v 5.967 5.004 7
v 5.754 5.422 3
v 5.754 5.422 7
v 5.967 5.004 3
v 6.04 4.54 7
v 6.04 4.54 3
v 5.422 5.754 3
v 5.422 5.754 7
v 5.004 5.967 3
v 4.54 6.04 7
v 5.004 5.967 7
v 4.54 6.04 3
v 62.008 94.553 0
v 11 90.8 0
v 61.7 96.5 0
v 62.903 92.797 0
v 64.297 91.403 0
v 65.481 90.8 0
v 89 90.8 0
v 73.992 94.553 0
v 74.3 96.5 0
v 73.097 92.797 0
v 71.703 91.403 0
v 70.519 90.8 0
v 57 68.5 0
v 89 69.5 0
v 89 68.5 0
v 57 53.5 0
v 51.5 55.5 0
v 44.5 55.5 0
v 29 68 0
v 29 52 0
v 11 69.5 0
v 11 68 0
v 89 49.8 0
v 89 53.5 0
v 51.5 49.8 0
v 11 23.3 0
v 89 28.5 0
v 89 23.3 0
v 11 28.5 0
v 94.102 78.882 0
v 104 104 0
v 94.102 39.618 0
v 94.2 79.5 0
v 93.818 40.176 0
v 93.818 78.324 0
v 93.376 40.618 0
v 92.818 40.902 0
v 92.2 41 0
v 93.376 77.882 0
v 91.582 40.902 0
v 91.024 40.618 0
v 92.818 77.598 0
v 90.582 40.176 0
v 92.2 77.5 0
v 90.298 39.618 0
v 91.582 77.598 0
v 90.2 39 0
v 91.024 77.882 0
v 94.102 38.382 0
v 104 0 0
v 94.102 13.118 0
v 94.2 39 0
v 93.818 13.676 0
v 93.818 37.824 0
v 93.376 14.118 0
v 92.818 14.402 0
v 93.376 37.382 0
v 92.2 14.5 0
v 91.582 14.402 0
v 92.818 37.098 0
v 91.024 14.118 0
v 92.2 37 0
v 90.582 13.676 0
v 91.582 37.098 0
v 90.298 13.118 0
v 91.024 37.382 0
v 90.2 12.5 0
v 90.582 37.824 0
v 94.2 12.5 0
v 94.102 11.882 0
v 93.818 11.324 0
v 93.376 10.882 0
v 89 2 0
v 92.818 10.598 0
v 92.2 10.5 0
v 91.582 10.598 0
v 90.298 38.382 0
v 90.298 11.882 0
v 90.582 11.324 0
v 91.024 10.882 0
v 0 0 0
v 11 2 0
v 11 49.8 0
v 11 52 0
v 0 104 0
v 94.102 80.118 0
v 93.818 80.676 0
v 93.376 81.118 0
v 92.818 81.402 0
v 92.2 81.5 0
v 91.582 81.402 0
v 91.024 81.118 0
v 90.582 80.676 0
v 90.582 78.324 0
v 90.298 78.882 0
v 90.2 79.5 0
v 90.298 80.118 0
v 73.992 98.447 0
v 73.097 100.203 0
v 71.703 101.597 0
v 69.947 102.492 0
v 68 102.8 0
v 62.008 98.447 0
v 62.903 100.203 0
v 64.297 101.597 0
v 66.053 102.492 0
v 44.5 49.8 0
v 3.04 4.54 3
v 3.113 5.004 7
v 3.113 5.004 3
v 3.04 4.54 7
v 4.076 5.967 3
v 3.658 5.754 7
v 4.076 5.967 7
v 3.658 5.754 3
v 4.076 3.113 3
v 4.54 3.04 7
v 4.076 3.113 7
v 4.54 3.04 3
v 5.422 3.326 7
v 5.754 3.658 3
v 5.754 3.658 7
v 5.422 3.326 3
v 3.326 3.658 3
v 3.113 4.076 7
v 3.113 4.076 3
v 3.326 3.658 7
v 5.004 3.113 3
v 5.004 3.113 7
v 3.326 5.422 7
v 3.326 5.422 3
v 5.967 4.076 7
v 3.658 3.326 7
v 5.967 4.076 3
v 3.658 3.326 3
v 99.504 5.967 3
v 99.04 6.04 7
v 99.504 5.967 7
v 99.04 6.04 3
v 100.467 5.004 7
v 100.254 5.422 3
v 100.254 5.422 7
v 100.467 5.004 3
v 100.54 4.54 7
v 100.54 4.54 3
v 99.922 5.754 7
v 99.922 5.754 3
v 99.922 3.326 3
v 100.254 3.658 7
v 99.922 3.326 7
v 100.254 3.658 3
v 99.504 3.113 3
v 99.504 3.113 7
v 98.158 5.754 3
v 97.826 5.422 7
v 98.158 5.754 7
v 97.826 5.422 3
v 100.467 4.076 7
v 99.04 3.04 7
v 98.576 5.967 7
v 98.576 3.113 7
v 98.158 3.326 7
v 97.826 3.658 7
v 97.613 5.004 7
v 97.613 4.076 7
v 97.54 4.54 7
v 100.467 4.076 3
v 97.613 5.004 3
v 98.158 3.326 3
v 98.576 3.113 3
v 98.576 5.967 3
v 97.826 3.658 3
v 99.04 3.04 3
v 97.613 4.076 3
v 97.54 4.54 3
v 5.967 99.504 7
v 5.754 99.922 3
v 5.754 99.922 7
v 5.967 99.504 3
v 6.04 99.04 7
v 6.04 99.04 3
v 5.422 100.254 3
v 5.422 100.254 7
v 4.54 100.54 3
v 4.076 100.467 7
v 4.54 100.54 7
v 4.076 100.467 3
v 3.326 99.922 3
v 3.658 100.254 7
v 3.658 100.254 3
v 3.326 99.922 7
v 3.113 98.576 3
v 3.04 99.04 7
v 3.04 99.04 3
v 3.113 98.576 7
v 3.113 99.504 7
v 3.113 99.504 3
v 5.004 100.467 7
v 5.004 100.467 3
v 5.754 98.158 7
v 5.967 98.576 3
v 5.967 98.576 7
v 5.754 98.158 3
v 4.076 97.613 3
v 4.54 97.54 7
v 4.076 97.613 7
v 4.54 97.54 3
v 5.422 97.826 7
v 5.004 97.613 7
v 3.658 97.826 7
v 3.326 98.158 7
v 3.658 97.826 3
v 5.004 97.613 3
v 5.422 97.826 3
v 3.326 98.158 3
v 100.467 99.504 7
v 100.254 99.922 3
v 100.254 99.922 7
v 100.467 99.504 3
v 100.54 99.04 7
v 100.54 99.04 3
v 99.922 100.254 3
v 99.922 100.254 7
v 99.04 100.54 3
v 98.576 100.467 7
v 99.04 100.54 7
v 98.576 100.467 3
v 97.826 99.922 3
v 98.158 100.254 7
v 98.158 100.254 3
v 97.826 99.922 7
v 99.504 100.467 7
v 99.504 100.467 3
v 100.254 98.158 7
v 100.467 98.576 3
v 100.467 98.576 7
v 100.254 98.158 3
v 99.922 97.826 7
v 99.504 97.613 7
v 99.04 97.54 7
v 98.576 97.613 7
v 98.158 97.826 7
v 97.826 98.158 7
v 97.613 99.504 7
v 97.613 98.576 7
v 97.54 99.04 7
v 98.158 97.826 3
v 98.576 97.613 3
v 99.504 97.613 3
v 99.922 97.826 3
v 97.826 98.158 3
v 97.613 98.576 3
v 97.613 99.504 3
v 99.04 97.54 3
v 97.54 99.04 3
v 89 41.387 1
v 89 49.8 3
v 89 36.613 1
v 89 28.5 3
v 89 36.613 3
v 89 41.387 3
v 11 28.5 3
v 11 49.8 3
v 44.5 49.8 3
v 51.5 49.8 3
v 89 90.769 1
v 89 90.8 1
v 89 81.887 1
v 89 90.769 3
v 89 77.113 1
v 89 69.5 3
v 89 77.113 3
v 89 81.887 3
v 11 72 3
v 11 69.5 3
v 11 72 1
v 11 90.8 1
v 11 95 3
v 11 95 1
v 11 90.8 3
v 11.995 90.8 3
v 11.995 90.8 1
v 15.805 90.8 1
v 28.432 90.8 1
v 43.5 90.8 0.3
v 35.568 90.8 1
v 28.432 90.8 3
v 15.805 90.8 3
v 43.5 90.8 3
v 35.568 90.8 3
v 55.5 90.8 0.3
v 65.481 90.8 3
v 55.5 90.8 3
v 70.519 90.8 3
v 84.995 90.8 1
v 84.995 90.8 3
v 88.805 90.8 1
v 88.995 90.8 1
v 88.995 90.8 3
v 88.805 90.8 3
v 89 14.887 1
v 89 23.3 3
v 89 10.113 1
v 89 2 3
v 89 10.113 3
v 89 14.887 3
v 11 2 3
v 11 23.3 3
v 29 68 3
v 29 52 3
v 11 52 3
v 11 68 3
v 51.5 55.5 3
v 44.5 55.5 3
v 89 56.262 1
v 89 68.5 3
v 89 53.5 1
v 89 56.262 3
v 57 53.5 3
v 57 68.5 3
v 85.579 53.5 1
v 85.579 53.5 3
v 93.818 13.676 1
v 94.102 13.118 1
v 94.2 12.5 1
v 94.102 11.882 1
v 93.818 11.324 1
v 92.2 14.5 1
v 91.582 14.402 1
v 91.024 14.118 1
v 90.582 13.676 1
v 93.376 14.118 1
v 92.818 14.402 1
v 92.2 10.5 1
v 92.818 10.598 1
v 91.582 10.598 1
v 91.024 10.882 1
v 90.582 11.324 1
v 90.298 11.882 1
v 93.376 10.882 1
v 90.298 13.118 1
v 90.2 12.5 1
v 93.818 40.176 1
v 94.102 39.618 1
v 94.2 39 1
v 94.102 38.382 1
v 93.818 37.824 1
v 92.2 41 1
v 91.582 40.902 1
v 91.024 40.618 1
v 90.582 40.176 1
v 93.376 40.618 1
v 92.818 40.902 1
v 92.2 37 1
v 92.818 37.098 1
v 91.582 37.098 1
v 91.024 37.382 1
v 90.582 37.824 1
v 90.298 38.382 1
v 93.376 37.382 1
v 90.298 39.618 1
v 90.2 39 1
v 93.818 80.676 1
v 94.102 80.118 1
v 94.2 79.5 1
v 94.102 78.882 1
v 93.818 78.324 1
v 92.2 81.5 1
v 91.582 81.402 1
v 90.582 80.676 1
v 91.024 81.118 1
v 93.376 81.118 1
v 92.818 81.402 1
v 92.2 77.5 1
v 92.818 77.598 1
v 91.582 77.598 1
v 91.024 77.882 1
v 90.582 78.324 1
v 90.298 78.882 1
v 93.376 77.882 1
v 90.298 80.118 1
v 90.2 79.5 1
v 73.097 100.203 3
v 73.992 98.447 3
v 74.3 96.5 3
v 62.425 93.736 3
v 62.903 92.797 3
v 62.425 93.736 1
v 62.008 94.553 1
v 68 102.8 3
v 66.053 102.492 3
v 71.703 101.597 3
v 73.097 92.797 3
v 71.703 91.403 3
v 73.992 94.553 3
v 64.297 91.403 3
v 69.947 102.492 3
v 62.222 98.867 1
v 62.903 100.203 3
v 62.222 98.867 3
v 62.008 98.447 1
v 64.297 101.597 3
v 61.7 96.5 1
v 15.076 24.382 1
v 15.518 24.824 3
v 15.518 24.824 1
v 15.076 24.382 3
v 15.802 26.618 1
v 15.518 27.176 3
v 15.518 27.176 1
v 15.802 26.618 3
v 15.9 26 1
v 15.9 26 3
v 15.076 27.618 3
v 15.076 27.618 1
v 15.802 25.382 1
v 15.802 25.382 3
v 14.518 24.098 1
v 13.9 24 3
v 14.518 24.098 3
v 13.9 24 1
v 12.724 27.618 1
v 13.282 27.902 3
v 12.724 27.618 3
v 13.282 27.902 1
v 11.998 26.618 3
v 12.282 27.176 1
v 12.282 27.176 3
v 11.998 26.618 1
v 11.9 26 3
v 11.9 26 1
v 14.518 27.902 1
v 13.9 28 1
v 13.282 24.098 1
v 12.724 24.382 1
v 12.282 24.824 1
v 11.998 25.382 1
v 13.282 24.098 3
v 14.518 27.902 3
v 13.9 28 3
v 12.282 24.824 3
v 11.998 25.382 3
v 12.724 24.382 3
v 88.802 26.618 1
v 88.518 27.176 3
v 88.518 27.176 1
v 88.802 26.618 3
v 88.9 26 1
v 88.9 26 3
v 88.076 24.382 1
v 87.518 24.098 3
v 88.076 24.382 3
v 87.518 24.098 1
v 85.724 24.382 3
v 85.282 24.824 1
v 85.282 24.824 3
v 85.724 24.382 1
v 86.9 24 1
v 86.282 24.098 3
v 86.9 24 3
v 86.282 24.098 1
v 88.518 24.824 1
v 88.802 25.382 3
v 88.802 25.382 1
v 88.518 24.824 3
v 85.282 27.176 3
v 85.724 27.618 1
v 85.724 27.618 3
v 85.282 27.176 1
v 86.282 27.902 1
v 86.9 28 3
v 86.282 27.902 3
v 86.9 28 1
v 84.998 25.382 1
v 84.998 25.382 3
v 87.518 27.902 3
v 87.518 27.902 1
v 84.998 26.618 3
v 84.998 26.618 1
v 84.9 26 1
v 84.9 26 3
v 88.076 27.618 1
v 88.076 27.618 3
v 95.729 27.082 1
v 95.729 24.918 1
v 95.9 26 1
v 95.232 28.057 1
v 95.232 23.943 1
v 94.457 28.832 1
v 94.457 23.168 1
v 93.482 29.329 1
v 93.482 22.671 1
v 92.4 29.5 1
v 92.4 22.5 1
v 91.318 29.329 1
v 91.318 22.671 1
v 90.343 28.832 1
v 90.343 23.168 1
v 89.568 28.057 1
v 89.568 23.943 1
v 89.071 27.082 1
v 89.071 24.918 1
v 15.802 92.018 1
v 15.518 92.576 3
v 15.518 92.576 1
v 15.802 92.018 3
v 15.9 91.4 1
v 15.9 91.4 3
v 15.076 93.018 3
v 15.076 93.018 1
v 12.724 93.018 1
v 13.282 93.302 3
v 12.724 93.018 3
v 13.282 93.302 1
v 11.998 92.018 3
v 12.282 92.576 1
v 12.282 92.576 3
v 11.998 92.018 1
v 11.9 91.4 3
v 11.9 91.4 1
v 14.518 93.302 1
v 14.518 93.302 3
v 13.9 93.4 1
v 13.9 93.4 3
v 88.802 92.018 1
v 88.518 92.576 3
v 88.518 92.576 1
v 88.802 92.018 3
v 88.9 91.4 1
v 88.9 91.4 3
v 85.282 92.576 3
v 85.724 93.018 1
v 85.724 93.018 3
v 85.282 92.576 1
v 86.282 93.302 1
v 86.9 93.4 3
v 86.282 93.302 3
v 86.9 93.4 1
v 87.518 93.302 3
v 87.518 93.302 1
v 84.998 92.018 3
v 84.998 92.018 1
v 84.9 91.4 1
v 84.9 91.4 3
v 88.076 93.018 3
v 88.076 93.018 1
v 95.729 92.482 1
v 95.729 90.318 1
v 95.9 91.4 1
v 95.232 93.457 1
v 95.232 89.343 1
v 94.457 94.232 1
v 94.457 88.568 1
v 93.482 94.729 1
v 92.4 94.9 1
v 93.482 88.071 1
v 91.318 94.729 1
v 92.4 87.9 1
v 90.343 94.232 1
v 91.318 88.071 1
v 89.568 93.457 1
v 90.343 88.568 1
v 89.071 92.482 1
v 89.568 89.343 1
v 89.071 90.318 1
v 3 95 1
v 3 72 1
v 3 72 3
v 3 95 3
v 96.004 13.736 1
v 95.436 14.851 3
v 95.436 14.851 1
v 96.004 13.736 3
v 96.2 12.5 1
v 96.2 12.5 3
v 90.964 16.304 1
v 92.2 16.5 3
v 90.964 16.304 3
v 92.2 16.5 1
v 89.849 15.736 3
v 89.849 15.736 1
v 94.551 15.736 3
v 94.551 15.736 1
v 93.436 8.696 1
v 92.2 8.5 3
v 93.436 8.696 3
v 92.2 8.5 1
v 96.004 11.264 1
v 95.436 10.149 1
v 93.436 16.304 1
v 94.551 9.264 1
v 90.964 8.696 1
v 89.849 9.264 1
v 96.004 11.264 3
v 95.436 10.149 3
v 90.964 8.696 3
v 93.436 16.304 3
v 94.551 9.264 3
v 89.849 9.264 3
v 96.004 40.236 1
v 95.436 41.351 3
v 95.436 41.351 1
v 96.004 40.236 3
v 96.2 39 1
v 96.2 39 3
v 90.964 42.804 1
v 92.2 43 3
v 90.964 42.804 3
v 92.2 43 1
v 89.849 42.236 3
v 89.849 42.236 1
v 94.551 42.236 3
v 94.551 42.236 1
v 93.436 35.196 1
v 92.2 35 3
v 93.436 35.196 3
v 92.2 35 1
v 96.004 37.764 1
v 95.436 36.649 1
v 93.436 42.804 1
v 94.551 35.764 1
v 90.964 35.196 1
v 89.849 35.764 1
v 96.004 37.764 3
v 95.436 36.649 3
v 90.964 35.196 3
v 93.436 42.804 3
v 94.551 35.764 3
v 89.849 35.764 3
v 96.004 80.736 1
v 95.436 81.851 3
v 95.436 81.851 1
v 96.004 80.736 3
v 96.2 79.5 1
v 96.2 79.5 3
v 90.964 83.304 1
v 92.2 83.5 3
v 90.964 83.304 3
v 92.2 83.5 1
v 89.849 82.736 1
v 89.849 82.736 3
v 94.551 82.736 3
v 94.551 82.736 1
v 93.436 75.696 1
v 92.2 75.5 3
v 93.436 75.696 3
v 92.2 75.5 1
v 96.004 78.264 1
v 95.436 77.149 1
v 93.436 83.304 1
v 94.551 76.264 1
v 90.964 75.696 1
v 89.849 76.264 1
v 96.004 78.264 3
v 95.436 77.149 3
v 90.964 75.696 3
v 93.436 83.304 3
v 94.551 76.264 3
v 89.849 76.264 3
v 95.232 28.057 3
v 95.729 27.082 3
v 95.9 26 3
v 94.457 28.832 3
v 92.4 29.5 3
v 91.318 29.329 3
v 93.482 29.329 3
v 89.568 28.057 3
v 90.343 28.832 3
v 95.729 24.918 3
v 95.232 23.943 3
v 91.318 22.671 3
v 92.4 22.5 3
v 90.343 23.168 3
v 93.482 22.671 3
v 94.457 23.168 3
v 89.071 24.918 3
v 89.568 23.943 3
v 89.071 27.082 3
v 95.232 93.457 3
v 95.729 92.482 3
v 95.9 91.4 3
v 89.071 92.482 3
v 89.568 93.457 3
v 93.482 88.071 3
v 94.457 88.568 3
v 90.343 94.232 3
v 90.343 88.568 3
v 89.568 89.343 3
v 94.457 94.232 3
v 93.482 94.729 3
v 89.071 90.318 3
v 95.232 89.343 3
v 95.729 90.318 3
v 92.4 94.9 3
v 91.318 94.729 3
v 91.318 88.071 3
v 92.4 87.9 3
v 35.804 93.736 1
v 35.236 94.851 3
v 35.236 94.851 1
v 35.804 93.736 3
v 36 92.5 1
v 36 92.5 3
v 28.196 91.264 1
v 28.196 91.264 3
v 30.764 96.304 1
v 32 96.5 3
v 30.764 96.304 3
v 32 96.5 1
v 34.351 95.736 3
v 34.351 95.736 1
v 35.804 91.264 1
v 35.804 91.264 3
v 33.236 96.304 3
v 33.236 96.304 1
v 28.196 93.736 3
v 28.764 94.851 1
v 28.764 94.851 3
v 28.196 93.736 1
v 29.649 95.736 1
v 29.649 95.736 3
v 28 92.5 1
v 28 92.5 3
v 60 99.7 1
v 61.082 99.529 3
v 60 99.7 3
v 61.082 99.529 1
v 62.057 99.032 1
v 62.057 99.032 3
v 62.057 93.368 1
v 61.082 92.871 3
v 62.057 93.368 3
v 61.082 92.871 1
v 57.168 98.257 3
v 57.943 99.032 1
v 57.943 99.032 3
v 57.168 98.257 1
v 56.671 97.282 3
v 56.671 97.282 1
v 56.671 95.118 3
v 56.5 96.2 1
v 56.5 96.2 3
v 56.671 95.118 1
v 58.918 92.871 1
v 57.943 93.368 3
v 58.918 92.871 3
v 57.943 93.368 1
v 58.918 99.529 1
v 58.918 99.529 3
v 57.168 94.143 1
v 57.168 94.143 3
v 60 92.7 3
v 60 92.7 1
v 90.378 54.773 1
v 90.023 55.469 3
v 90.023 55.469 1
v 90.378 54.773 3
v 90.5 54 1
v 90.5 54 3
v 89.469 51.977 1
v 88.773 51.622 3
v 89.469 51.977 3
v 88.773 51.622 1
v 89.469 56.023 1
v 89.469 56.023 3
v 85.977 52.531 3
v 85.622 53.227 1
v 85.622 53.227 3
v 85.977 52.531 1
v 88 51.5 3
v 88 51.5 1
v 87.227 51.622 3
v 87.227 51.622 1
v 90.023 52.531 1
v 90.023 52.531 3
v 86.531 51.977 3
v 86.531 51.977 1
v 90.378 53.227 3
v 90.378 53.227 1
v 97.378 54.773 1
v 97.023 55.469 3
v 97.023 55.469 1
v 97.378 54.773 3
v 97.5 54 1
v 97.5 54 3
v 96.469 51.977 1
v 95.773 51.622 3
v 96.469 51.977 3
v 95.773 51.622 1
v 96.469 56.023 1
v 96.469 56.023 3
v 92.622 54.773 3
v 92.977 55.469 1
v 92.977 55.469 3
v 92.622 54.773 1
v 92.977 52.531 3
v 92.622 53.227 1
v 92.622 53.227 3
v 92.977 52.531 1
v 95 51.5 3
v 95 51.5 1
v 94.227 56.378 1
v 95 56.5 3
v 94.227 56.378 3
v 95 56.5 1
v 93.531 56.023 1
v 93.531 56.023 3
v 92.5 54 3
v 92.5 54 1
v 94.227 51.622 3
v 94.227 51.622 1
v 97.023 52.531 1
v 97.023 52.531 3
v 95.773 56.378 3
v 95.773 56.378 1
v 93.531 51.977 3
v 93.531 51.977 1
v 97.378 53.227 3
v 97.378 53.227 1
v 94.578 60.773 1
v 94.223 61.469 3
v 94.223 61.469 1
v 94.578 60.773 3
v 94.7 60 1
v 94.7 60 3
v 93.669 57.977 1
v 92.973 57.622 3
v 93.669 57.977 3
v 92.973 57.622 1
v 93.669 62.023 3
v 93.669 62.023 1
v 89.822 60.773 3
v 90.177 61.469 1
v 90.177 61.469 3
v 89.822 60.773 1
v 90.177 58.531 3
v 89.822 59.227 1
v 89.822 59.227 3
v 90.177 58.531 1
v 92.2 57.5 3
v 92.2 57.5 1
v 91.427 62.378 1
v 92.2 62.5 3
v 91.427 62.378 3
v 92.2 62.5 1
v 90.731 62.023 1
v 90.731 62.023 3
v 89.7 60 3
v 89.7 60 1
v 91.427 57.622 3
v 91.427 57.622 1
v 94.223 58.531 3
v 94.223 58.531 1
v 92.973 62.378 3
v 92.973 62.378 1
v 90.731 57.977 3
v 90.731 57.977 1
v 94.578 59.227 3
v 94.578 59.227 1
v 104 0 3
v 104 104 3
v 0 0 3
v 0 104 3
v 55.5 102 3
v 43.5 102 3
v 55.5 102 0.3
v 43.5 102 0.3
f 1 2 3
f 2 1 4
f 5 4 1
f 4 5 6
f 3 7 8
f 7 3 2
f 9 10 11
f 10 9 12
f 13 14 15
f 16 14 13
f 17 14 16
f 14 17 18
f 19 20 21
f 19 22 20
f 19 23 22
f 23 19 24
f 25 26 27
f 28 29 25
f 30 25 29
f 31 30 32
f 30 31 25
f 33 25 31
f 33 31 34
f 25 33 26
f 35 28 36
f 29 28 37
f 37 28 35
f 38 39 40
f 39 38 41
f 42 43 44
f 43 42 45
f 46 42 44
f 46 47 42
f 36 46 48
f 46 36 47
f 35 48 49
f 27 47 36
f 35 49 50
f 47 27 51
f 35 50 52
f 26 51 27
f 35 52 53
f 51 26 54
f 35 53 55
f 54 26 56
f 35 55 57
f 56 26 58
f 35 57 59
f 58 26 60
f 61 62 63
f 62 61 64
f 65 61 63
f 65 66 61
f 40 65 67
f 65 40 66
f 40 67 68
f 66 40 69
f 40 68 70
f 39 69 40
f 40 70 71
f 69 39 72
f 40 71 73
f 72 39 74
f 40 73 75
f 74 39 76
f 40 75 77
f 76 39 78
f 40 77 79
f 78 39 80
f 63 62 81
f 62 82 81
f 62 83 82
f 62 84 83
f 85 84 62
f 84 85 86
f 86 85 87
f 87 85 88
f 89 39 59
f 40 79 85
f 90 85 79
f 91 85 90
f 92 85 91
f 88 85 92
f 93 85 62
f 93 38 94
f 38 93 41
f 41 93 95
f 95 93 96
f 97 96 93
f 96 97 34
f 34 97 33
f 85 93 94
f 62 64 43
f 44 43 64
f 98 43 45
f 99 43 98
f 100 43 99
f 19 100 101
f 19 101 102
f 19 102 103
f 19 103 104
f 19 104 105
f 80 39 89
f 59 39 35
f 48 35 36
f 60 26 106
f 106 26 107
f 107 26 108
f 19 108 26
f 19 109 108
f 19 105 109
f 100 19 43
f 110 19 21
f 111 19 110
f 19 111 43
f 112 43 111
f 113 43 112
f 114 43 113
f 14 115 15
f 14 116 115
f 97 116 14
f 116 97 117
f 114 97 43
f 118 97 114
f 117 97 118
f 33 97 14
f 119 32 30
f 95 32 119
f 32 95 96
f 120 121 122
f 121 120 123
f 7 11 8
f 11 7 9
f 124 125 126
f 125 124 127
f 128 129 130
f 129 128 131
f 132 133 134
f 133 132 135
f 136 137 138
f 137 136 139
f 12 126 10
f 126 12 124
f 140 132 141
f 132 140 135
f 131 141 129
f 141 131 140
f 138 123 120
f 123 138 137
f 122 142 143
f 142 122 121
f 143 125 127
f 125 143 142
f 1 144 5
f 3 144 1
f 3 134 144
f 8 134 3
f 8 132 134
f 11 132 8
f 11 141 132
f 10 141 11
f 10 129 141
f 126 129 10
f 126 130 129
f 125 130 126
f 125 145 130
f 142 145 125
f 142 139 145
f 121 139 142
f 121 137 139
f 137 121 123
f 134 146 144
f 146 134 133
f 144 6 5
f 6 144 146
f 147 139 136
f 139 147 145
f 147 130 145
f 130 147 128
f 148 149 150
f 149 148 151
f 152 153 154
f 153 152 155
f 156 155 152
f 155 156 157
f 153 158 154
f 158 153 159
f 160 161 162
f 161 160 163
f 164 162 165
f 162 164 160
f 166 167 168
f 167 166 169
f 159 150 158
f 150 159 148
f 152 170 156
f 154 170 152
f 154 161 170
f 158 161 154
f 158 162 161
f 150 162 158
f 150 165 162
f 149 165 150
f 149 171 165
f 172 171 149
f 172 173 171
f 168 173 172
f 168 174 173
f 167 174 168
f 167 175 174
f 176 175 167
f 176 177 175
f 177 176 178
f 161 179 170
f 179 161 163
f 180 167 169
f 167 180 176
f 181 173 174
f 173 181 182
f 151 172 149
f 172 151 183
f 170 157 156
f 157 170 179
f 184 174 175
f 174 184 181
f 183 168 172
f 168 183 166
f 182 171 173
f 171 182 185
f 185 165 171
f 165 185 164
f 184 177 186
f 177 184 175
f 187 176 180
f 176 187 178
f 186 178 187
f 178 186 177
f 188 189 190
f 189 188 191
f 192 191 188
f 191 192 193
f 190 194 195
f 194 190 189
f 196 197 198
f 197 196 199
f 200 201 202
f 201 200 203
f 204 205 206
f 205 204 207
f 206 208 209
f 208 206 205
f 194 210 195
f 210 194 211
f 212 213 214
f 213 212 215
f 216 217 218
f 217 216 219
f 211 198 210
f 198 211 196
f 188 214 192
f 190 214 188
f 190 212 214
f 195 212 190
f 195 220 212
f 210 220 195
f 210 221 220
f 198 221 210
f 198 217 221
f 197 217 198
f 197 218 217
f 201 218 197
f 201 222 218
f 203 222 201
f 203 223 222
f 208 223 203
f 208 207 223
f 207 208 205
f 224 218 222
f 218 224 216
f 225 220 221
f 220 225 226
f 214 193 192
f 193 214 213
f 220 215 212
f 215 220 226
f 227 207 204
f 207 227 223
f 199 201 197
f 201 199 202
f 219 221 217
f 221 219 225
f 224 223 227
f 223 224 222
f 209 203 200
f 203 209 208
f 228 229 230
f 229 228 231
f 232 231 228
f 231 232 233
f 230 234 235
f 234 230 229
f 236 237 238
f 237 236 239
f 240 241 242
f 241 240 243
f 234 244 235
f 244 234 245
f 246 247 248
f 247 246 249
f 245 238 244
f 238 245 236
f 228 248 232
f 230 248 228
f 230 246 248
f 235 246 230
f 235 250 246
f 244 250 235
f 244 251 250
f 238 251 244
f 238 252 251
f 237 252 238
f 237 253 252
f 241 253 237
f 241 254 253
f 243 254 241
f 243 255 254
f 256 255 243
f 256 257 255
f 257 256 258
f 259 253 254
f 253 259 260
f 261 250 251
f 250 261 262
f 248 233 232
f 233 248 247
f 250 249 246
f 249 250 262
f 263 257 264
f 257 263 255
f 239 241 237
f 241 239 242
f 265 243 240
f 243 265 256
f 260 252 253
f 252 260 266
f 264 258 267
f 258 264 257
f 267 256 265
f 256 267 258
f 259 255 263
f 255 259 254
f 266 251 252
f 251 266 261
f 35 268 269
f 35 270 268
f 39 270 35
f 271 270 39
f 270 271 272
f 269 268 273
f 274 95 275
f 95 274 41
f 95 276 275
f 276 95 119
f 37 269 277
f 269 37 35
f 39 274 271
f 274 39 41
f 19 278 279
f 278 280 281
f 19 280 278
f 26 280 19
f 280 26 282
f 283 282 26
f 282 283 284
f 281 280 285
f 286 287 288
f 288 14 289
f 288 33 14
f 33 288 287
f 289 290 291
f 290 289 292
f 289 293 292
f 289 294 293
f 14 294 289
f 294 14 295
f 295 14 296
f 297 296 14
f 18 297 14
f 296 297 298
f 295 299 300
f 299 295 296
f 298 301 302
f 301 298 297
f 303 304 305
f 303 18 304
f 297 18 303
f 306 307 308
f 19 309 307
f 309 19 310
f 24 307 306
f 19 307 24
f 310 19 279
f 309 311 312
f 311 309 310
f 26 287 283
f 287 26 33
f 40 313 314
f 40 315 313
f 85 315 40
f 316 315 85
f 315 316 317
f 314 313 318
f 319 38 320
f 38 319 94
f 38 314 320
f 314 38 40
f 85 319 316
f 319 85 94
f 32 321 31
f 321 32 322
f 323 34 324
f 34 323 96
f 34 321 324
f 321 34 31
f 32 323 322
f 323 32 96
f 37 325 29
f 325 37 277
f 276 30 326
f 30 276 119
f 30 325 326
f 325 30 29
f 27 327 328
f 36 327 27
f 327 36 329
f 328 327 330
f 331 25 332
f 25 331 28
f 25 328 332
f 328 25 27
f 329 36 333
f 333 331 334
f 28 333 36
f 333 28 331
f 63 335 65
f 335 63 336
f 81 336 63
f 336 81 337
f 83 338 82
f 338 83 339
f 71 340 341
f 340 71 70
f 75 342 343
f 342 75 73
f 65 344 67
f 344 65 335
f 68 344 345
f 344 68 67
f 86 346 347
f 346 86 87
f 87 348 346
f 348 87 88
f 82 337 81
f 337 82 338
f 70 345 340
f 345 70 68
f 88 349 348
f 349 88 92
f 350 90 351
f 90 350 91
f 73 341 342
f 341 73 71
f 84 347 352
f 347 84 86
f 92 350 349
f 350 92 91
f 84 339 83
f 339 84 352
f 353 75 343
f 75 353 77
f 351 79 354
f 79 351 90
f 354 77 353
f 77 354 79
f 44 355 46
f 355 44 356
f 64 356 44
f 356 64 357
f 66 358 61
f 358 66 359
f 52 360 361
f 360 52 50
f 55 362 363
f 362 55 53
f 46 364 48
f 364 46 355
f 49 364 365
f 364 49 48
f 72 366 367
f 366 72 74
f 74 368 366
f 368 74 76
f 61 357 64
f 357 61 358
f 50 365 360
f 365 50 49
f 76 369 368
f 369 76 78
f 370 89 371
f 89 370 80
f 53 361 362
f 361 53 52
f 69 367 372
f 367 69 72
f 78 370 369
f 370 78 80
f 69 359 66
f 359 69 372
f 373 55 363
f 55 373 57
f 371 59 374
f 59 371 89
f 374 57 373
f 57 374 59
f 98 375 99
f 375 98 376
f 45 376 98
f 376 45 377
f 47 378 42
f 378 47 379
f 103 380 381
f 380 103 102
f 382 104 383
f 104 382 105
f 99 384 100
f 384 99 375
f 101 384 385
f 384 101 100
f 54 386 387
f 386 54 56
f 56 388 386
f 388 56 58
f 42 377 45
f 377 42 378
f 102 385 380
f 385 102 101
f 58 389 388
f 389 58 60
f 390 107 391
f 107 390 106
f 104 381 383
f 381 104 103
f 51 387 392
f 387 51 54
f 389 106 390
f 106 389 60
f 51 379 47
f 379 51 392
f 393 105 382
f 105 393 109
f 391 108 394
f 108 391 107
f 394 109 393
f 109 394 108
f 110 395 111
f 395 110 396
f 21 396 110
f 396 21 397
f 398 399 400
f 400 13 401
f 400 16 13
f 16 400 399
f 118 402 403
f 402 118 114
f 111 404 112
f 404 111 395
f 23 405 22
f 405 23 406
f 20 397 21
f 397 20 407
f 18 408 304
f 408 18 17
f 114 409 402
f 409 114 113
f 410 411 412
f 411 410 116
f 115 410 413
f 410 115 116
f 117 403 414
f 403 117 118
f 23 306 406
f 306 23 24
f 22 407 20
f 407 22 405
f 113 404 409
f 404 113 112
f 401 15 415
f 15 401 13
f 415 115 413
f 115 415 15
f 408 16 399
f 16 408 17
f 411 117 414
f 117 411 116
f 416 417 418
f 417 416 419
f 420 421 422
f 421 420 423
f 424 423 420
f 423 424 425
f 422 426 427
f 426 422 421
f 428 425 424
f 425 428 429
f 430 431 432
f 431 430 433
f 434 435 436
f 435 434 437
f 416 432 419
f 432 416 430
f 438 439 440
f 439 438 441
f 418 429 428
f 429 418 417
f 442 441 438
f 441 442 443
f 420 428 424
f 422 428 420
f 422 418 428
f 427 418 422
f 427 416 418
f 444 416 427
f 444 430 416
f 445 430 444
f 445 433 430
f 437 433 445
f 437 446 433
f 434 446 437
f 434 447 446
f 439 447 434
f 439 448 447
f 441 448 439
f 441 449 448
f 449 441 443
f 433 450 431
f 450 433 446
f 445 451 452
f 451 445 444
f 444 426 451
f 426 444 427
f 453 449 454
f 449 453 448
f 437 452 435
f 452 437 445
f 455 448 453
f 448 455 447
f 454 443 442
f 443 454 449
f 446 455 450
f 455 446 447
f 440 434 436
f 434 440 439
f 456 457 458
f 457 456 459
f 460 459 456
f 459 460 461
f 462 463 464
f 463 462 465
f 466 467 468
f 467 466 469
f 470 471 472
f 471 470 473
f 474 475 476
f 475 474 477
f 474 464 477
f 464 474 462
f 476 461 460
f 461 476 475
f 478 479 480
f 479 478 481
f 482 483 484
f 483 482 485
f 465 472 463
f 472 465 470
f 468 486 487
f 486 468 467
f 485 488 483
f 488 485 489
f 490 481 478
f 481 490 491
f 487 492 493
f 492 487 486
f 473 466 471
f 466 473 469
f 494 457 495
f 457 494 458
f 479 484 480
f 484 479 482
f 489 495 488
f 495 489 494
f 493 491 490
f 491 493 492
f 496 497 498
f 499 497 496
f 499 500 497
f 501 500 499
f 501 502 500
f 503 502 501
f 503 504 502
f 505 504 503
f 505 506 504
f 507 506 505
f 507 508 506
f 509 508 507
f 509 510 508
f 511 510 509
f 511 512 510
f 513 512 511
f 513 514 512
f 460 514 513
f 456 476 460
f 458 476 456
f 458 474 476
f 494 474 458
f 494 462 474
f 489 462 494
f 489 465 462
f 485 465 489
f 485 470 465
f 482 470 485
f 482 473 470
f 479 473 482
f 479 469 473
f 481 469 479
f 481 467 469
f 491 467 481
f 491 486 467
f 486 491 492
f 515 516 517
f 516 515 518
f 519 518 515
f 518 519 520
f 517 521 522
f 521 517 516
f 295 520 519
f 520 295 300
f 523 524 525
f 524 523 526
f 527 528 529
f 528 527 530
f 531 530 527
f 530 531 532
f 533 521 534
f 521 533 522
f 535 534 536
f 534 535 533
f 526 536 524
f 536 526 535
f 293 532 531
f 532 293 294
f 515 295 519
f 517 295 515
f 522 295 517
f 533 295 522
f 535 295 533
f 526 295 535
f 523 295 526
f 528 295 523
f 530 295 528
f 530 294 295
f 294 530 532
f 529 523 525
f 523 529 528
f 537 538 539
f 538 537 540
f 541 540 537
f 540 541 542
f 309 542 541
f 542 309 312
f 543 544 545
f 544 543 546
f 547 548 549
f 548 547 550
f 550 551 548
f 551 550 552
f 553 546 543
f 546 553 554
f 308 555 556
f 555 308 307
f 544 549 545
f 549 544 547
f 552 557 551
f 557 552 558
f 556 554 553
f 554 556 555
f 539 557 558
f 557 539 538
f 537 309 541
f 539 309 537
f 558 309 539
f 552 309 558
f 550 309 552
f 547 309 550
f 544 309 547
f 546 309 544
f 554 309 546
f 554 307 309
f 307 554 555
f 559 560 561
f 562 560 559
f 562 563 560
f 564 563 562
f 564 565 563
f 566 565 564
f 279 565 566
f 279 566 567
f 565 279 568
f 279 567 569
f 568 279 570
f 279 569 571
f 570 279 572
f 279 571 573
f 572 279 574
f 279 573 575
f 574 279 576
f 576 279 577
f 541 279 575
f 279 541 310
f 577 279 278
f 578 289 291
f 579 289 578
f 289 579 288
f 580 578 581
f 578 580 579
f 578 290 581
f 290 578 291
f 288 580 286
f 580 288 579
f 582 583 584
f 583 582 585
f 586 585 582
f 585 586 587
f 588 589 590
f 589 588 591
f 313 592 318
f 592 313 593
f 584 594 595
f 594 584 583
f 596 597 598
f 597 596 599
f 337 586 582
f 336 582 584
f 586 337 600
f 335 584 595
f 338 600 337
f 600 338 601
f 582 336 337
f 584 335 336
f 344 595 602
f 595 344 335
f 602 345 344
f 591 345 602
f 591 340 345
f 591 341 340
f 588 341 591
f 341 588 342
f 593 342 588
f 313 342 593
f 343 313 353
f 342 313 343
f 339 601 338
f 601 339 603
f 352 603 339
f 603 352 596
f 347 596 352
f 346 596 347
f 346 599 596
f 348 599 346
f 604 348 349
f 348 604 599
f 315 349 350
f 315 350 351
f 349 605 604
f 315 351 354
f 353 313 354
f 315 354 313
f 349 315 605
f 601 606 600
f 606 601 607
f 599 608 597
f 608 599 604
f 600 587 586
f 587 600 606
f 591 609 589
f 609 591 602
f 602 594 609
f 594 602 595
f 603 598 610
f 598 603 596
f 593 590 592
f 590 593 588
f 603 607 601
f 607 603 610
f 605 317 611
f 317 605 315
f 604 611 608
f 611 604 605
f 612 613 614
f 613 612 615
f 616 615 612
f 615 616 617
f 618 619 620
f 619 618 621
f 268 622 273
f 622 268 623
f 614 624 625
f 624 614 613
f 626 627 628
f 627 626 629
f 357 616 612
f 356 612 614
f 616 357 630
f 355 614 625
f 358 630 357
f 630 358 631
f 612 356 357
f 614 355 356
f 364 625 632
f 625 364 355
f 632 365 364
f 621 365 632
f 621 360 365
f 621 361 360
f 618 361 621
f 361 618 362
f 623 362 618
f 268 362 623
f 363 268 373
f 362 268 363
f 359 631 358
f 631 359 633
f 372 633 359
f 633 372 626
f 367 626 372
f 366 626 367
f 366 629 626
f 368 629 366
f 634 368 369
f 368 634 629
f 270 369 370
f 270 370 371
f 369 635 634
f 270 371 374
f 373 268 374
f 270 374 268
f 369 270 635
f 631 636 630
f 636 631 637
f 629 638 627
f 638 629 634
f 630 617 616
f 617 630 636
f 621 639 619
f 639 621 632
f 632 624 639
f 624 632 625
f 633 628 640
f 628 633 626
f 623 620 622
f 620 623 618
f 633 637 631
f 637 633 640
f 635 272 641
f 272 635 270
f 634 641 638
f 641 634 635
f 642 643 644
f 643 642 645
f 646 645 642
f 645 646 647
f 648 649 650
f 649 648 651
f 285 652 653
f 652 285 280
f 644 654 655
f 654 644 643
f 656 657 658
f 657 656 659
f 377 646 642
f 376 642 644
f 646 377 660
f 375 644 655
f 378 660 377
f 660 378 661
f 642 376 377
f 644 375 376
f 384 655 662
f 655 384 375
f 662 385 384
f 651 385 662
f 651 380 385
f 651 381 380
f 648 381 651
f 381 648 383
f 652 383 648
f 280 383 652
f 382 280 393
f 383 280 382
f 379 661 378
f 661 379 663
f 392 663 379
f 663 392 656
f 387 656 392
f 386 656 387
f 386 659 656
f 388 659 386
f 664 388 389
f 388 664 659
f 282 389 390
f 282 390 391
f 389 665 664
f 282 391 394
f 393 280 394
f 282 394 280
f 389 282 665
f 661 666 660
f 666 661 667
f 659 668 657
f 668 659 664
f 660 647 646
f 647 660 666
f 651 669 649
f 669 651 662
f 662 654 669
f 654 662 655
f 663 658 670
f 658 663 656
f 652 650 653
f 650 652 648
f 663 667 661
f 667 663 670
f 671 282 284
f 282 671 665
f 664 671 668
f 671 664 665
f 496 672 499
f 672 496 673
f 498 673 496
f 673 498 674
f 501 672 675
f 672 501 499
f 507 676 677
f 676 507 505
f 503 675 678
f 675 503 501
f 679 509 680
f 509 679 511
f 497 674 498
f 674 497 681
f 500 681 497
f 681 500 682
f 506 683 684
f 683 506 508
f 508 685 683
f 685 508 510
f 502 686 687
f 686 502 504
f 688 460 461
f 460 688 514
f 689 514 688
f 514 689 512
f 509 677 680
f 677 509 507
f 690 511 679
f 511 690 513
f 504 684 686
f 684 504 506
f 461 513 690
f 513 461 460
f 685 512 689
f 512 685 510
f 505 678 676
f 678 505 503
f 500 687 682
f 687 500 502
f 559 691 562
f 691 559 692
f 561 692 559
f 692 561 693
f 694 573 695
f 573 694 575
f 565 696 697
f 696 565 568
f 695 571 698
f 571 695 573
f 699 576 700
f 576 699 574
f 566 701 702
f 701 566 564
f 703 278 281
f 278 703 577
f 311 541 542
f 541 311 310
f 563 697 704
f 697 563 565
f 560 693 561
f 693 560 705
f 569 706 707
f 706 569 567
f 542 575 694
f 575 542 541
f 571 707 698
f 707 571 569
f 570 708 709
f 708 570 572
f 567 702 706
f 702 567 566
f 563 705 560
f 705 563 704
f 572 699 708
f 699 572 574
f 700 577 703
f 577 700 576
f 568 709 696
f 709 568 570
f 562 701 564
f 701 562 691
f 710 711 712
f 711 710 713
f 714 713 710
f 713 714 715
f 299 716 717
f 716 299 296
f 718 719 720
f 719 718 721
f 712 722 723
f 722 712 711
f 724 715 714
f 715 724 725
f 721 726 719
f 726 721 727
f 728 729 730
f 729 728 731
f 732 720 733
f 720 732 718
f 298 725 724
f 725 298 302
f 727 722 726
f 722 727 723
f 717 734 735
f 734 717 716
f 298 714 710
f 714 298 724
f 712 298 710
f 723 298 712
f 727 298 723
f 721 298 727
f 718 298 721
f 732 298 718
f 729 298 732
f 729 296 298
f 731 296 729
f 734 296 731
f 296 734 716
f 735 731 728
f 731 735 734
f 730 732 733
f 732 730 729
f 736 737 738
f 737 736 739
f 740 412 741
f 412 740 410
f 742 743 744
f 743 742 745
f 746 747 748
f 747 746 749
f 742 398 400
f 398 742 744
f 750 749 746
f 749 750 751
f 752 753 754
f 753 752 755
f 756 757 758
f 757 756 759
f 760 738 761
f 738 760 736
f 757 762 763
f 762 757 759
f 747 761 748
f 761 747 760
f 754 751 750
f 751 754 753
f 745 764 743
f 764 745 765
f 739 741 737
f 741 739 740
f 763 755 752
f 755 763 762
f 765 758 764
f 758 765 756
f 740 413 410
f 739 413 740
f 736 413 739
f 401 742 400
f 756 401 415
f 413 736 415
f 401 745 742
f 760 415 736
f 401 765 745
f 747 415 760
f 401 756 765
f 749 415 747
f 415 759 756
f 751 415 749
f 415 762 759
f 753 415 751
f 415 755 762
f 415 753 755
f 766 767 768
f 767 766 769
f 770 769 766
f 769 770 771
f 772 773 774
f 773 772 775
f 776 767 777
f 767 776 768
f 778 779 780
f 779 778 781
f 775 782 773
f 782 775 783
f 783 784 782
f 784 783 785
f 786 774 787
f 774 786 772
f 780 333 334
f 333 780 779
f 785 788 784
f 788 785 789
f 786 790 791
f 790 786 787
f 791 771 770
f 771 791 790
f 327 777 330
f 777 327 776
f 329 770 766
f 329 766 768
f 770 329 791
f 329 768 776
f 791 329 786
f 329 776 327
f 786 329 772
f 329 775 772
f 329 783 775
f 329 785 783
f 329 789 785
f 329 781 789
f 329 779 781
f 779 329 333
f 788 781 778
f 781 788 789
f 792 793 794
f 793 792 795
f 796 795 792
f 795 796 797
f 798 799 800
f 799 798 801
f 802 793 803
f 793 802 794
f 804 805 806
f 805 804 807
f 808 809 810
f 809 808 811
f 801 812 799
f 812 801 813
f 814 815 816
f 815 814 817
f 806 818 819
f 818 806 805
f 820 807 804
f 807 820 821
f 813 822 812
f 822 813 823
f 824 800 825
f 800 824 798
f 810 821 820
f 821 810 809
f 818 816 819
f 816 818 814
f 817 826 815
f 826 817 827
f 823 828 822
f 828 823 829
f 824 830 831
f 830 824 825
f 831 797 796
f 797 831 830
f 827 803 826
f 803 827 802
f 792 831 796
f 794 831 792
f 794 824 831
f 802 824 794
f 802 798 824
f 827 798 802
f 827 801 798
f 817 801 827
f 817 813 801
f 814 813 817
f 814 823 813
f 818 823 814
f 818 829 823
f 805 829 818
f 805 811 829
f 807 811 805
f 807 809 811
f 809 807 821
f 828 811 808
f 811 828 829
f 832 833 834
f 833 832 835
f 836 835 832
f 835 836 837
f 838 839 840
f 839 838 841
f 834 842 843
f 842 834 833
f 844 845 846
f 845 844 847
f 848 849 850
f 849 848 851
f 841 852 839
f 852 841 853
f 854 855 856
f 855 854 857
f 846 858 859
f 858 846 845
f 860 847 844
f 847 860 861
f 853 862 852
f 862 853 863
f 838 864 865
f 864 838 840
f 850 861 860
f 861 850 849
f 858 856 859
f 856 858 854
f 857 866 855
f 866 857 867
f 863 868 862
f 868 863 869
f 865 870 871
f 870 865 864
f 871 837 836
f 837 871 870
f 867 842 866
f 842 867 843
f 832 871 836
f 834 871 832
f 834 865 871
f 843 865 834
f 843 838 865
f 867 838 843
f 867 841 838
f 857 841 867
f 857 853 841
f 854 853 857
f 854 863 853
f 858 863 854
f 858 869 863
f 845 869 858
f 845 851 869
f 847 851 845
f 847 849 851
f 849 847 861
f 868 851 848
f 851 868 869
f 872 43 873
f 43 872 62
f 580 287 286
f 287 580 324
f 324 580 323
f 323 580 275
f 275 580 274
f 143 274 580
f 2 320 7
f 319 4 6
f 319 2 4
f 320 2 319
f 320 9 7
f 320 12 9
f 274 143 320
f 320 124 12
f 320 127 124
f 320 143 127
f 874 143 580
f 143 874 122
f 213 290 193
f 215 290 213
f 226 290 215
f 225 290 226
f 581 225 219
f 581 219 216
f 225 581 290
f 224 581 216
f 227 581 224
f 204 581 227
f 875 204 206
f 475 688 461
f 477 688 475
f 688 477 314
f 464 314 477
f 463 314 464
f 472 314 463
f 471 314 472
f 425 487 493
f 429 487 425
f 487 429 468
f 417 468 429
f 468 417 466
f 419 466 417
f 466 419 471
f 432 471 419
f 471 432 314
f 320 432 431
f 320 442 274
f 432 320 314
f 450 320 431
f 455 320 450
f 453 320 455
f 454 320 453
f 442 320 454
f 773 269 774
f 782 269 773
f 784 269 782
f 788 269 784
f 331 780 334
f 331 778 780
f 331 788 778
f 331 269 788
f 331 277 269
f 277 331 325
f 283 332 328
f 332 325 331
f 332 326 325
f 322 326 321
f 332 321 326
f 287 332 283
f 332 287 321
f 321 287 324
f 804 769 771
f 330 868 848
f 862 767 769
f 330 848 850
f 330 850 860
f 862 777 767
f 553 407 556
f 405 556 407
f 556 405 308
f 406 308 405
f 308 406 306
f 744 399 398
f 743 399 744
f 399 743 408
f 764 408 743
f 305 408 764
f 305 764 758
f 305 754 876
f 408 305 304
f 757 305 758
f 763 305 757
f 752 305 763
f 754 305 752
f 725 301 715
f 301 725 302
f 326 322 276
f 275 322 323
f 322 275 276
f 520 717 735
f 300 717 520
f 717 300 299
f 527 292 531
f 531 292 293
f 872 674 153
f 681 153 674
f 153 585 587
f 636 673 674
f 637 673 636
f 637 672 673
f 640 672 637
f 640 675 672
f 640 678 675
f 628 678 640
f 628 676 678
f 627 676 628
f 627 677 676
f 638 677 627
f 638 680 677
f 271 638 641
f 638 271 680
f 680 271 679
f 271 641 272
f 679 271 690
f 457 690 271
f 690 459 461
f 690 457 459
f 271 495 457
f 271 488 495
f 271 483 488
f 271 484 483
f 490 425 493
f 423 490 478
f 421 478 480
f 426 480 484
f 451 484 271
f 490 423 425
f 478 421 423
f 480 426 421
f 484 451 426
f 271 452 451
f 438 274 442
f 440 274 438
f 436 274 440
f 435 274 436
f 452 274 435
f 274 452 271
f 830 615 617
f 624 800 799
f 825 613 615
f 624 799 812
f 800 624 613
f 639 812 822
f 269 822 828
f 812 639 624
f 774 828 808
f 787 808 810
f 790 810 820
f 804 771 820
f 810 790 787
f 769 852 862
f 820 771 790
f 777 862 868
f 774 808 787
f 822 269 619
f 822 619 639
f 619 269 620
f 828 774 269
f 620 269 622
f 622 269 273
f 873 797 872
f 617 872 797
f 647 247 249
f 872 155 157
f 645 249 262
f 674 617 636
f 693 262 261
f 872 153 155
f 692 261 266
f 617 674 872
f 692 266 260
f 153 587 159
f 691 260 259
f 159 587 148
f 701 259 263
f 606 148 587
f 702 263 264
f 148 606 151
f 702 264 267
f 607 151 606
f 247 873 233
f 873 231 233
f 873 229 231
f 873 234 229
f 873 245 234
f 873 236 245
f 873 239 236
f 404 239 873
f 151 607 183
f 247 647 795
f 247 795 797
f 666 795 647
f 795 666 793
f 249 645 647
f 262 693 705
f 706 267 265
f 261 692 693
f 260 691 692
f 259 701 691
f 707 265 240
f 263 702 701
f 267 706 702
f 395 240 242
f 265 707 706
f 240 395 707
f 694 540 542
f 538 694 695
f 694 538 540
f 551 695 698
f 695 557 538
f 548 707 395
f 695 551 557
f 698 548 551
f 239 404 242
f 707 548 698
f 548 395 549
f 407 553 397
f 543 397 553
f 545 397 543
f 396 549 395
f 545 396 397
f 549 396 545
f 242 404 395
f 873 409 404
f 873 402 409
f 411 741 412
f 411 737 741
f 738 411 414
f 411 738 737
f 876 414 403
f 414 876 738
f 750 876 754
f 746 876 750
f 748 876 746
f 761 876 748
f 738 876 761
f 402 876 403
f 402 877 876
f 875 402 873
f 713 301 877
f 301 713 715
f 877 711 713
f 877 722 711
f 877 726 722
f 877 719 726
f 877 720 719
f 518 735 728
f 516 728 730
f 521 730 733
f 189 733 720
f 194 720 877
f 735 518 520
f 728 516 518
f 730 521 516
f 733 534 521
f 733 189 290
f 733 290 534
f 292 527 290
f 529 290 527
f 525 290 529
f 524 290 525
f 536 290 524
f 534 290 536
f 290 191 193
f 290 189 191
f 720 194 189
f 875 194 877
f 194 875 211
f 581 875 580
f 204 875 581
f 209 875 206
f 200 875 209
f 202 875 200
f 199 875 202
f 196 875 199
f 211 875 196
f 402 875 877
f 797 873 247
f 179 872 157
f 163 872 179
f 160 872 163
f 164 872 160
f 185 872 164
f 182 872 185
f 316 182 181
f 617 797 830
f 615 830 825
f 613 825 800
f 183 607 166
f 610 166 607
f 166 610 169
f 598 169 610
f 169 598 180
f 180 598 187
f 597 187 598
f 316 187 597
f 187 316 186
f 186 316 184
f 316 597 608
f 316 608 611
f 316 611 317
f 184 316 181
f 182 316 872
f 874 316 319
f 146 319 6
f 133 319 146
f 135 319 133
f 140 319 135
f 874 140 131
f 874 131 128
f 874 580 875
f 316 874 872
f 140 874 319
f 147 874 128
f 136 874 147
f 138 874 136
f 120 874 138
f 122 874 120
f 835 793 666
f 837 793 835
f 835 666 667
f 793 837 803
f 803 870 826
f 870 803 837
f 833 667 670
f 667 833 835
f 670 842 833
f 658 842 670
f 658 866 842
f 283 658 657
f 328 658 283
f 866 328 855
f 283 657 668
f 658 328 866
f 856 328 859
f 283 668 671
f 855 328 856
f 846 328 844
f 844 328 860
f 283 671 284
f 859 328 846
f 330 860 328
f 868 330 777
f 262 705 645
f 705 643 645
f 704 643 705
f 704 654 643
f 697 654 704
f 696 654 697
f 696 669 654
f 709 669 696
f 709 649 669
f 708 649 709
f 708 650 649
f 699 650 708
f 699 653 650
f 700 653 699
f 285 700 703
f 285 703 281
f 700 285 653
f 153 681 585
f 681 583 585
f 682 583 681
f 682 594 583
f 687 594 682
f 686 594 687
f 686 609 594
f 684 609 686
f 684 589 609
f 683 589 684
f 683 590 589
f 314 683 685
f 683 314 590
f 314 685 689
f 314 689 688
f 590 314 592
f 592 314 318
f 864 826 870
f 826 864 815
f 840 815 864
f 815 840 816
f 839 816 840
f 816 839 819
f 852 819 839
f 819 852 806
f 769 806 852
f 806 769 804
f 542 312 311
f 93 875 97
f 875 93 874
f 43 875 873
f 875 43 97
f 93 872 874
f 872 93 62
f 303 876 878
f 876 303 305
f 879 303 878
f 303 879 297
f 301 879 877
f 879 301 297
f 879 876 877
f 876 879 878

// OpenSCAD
$fn=20;
pcbx=100;
pcby=100;
bh=2;

translate([bh,bh,0])
translate([2.54,2.54,0]) {
 cylinder(h=7,r=1.5);
translate([94.5,0,0]) 
 cylinder(h=7,r=1.5);
translate([0,94.5,0]) 
 cylinder(h=7,r=1.5);
translate([94.5,94.5,0]) 
 cylinder(h=7,r=1.5);
}
difference(){
cube([pcbx+bh+bh,pcby+bh+bh,3]);
translate([bh,bh,0]) {


translate([9,26.5,0]) cube([78,21.3,4]); //B3
translate([9,67.5,0]) cube([78,21.3,4]); //B4
translate([9,0,0]) cube([78,21.3,4]);  //b5
translate([9,50,0]) cube([18,16,4]);   //label
translate([46,50,0]) cube([7,7,4*2],true);  // reset switch  y=50
translate([55,51.5,0]) cube([32,15,4]);  //usbcom

translate([90.2,10.5,0]) cylinder(h=4,r=2);//led3
translate([90.2,37,0]) cylinder(h=4,r=2);//led4
translate([90.2,77.5,0]) cylinder(h=4,r=2);//led5

translate([66,94.5,0]) cylinder(h=4,r=6.3);//bat
}
translate([bh,bh,0.3]){
translate([41.5,88,0]) cube([12,12,4]);//U9
}
translate([bh,bh,1]){
translate([1,70,0]) cube([8,23,4]); //s2 s3
translate([90.2,10.5,0]) cylinder(h=4,r=4);//led3
translate([90.2,37,0]) cylinder(h=4,r=4);//led4
translate([90.2,77.5,0]) cylinder(h=4,r=4);//led5

translate([11.9,100-76,0])  {
cylinder(h=4,r=2);//B2
translate([73,0,0]) cylinder(h=4,r=2);//B2
}

translate([11.9,100-10.6,0])  {
cylinder(h=4,r=2);//B1
translate([73,0,0]) cylinder(h=4,r=2);//B1
}

translate([90.4,100-76,0]) cylinder(h=4,r=3.5);//led2
translate([90.4,100-10.6,0]) cylinder(h=4,r=3.5);//led1

translate([30,100-9.5,0]) cylinder(h=4,r=4);//r24,r3

translate([58,100-5.8,0]) cylinder(h=4,r=3.5);//d1

translate([86,100-48,0]) cylinder(h=4,r=2.5);//power
translate([93,100-48,0]) cylinder(h=4,r=2.5);//power
translate([90.2,100-42,0]) cylinder(h=4,r=2.5);//power
}
}
